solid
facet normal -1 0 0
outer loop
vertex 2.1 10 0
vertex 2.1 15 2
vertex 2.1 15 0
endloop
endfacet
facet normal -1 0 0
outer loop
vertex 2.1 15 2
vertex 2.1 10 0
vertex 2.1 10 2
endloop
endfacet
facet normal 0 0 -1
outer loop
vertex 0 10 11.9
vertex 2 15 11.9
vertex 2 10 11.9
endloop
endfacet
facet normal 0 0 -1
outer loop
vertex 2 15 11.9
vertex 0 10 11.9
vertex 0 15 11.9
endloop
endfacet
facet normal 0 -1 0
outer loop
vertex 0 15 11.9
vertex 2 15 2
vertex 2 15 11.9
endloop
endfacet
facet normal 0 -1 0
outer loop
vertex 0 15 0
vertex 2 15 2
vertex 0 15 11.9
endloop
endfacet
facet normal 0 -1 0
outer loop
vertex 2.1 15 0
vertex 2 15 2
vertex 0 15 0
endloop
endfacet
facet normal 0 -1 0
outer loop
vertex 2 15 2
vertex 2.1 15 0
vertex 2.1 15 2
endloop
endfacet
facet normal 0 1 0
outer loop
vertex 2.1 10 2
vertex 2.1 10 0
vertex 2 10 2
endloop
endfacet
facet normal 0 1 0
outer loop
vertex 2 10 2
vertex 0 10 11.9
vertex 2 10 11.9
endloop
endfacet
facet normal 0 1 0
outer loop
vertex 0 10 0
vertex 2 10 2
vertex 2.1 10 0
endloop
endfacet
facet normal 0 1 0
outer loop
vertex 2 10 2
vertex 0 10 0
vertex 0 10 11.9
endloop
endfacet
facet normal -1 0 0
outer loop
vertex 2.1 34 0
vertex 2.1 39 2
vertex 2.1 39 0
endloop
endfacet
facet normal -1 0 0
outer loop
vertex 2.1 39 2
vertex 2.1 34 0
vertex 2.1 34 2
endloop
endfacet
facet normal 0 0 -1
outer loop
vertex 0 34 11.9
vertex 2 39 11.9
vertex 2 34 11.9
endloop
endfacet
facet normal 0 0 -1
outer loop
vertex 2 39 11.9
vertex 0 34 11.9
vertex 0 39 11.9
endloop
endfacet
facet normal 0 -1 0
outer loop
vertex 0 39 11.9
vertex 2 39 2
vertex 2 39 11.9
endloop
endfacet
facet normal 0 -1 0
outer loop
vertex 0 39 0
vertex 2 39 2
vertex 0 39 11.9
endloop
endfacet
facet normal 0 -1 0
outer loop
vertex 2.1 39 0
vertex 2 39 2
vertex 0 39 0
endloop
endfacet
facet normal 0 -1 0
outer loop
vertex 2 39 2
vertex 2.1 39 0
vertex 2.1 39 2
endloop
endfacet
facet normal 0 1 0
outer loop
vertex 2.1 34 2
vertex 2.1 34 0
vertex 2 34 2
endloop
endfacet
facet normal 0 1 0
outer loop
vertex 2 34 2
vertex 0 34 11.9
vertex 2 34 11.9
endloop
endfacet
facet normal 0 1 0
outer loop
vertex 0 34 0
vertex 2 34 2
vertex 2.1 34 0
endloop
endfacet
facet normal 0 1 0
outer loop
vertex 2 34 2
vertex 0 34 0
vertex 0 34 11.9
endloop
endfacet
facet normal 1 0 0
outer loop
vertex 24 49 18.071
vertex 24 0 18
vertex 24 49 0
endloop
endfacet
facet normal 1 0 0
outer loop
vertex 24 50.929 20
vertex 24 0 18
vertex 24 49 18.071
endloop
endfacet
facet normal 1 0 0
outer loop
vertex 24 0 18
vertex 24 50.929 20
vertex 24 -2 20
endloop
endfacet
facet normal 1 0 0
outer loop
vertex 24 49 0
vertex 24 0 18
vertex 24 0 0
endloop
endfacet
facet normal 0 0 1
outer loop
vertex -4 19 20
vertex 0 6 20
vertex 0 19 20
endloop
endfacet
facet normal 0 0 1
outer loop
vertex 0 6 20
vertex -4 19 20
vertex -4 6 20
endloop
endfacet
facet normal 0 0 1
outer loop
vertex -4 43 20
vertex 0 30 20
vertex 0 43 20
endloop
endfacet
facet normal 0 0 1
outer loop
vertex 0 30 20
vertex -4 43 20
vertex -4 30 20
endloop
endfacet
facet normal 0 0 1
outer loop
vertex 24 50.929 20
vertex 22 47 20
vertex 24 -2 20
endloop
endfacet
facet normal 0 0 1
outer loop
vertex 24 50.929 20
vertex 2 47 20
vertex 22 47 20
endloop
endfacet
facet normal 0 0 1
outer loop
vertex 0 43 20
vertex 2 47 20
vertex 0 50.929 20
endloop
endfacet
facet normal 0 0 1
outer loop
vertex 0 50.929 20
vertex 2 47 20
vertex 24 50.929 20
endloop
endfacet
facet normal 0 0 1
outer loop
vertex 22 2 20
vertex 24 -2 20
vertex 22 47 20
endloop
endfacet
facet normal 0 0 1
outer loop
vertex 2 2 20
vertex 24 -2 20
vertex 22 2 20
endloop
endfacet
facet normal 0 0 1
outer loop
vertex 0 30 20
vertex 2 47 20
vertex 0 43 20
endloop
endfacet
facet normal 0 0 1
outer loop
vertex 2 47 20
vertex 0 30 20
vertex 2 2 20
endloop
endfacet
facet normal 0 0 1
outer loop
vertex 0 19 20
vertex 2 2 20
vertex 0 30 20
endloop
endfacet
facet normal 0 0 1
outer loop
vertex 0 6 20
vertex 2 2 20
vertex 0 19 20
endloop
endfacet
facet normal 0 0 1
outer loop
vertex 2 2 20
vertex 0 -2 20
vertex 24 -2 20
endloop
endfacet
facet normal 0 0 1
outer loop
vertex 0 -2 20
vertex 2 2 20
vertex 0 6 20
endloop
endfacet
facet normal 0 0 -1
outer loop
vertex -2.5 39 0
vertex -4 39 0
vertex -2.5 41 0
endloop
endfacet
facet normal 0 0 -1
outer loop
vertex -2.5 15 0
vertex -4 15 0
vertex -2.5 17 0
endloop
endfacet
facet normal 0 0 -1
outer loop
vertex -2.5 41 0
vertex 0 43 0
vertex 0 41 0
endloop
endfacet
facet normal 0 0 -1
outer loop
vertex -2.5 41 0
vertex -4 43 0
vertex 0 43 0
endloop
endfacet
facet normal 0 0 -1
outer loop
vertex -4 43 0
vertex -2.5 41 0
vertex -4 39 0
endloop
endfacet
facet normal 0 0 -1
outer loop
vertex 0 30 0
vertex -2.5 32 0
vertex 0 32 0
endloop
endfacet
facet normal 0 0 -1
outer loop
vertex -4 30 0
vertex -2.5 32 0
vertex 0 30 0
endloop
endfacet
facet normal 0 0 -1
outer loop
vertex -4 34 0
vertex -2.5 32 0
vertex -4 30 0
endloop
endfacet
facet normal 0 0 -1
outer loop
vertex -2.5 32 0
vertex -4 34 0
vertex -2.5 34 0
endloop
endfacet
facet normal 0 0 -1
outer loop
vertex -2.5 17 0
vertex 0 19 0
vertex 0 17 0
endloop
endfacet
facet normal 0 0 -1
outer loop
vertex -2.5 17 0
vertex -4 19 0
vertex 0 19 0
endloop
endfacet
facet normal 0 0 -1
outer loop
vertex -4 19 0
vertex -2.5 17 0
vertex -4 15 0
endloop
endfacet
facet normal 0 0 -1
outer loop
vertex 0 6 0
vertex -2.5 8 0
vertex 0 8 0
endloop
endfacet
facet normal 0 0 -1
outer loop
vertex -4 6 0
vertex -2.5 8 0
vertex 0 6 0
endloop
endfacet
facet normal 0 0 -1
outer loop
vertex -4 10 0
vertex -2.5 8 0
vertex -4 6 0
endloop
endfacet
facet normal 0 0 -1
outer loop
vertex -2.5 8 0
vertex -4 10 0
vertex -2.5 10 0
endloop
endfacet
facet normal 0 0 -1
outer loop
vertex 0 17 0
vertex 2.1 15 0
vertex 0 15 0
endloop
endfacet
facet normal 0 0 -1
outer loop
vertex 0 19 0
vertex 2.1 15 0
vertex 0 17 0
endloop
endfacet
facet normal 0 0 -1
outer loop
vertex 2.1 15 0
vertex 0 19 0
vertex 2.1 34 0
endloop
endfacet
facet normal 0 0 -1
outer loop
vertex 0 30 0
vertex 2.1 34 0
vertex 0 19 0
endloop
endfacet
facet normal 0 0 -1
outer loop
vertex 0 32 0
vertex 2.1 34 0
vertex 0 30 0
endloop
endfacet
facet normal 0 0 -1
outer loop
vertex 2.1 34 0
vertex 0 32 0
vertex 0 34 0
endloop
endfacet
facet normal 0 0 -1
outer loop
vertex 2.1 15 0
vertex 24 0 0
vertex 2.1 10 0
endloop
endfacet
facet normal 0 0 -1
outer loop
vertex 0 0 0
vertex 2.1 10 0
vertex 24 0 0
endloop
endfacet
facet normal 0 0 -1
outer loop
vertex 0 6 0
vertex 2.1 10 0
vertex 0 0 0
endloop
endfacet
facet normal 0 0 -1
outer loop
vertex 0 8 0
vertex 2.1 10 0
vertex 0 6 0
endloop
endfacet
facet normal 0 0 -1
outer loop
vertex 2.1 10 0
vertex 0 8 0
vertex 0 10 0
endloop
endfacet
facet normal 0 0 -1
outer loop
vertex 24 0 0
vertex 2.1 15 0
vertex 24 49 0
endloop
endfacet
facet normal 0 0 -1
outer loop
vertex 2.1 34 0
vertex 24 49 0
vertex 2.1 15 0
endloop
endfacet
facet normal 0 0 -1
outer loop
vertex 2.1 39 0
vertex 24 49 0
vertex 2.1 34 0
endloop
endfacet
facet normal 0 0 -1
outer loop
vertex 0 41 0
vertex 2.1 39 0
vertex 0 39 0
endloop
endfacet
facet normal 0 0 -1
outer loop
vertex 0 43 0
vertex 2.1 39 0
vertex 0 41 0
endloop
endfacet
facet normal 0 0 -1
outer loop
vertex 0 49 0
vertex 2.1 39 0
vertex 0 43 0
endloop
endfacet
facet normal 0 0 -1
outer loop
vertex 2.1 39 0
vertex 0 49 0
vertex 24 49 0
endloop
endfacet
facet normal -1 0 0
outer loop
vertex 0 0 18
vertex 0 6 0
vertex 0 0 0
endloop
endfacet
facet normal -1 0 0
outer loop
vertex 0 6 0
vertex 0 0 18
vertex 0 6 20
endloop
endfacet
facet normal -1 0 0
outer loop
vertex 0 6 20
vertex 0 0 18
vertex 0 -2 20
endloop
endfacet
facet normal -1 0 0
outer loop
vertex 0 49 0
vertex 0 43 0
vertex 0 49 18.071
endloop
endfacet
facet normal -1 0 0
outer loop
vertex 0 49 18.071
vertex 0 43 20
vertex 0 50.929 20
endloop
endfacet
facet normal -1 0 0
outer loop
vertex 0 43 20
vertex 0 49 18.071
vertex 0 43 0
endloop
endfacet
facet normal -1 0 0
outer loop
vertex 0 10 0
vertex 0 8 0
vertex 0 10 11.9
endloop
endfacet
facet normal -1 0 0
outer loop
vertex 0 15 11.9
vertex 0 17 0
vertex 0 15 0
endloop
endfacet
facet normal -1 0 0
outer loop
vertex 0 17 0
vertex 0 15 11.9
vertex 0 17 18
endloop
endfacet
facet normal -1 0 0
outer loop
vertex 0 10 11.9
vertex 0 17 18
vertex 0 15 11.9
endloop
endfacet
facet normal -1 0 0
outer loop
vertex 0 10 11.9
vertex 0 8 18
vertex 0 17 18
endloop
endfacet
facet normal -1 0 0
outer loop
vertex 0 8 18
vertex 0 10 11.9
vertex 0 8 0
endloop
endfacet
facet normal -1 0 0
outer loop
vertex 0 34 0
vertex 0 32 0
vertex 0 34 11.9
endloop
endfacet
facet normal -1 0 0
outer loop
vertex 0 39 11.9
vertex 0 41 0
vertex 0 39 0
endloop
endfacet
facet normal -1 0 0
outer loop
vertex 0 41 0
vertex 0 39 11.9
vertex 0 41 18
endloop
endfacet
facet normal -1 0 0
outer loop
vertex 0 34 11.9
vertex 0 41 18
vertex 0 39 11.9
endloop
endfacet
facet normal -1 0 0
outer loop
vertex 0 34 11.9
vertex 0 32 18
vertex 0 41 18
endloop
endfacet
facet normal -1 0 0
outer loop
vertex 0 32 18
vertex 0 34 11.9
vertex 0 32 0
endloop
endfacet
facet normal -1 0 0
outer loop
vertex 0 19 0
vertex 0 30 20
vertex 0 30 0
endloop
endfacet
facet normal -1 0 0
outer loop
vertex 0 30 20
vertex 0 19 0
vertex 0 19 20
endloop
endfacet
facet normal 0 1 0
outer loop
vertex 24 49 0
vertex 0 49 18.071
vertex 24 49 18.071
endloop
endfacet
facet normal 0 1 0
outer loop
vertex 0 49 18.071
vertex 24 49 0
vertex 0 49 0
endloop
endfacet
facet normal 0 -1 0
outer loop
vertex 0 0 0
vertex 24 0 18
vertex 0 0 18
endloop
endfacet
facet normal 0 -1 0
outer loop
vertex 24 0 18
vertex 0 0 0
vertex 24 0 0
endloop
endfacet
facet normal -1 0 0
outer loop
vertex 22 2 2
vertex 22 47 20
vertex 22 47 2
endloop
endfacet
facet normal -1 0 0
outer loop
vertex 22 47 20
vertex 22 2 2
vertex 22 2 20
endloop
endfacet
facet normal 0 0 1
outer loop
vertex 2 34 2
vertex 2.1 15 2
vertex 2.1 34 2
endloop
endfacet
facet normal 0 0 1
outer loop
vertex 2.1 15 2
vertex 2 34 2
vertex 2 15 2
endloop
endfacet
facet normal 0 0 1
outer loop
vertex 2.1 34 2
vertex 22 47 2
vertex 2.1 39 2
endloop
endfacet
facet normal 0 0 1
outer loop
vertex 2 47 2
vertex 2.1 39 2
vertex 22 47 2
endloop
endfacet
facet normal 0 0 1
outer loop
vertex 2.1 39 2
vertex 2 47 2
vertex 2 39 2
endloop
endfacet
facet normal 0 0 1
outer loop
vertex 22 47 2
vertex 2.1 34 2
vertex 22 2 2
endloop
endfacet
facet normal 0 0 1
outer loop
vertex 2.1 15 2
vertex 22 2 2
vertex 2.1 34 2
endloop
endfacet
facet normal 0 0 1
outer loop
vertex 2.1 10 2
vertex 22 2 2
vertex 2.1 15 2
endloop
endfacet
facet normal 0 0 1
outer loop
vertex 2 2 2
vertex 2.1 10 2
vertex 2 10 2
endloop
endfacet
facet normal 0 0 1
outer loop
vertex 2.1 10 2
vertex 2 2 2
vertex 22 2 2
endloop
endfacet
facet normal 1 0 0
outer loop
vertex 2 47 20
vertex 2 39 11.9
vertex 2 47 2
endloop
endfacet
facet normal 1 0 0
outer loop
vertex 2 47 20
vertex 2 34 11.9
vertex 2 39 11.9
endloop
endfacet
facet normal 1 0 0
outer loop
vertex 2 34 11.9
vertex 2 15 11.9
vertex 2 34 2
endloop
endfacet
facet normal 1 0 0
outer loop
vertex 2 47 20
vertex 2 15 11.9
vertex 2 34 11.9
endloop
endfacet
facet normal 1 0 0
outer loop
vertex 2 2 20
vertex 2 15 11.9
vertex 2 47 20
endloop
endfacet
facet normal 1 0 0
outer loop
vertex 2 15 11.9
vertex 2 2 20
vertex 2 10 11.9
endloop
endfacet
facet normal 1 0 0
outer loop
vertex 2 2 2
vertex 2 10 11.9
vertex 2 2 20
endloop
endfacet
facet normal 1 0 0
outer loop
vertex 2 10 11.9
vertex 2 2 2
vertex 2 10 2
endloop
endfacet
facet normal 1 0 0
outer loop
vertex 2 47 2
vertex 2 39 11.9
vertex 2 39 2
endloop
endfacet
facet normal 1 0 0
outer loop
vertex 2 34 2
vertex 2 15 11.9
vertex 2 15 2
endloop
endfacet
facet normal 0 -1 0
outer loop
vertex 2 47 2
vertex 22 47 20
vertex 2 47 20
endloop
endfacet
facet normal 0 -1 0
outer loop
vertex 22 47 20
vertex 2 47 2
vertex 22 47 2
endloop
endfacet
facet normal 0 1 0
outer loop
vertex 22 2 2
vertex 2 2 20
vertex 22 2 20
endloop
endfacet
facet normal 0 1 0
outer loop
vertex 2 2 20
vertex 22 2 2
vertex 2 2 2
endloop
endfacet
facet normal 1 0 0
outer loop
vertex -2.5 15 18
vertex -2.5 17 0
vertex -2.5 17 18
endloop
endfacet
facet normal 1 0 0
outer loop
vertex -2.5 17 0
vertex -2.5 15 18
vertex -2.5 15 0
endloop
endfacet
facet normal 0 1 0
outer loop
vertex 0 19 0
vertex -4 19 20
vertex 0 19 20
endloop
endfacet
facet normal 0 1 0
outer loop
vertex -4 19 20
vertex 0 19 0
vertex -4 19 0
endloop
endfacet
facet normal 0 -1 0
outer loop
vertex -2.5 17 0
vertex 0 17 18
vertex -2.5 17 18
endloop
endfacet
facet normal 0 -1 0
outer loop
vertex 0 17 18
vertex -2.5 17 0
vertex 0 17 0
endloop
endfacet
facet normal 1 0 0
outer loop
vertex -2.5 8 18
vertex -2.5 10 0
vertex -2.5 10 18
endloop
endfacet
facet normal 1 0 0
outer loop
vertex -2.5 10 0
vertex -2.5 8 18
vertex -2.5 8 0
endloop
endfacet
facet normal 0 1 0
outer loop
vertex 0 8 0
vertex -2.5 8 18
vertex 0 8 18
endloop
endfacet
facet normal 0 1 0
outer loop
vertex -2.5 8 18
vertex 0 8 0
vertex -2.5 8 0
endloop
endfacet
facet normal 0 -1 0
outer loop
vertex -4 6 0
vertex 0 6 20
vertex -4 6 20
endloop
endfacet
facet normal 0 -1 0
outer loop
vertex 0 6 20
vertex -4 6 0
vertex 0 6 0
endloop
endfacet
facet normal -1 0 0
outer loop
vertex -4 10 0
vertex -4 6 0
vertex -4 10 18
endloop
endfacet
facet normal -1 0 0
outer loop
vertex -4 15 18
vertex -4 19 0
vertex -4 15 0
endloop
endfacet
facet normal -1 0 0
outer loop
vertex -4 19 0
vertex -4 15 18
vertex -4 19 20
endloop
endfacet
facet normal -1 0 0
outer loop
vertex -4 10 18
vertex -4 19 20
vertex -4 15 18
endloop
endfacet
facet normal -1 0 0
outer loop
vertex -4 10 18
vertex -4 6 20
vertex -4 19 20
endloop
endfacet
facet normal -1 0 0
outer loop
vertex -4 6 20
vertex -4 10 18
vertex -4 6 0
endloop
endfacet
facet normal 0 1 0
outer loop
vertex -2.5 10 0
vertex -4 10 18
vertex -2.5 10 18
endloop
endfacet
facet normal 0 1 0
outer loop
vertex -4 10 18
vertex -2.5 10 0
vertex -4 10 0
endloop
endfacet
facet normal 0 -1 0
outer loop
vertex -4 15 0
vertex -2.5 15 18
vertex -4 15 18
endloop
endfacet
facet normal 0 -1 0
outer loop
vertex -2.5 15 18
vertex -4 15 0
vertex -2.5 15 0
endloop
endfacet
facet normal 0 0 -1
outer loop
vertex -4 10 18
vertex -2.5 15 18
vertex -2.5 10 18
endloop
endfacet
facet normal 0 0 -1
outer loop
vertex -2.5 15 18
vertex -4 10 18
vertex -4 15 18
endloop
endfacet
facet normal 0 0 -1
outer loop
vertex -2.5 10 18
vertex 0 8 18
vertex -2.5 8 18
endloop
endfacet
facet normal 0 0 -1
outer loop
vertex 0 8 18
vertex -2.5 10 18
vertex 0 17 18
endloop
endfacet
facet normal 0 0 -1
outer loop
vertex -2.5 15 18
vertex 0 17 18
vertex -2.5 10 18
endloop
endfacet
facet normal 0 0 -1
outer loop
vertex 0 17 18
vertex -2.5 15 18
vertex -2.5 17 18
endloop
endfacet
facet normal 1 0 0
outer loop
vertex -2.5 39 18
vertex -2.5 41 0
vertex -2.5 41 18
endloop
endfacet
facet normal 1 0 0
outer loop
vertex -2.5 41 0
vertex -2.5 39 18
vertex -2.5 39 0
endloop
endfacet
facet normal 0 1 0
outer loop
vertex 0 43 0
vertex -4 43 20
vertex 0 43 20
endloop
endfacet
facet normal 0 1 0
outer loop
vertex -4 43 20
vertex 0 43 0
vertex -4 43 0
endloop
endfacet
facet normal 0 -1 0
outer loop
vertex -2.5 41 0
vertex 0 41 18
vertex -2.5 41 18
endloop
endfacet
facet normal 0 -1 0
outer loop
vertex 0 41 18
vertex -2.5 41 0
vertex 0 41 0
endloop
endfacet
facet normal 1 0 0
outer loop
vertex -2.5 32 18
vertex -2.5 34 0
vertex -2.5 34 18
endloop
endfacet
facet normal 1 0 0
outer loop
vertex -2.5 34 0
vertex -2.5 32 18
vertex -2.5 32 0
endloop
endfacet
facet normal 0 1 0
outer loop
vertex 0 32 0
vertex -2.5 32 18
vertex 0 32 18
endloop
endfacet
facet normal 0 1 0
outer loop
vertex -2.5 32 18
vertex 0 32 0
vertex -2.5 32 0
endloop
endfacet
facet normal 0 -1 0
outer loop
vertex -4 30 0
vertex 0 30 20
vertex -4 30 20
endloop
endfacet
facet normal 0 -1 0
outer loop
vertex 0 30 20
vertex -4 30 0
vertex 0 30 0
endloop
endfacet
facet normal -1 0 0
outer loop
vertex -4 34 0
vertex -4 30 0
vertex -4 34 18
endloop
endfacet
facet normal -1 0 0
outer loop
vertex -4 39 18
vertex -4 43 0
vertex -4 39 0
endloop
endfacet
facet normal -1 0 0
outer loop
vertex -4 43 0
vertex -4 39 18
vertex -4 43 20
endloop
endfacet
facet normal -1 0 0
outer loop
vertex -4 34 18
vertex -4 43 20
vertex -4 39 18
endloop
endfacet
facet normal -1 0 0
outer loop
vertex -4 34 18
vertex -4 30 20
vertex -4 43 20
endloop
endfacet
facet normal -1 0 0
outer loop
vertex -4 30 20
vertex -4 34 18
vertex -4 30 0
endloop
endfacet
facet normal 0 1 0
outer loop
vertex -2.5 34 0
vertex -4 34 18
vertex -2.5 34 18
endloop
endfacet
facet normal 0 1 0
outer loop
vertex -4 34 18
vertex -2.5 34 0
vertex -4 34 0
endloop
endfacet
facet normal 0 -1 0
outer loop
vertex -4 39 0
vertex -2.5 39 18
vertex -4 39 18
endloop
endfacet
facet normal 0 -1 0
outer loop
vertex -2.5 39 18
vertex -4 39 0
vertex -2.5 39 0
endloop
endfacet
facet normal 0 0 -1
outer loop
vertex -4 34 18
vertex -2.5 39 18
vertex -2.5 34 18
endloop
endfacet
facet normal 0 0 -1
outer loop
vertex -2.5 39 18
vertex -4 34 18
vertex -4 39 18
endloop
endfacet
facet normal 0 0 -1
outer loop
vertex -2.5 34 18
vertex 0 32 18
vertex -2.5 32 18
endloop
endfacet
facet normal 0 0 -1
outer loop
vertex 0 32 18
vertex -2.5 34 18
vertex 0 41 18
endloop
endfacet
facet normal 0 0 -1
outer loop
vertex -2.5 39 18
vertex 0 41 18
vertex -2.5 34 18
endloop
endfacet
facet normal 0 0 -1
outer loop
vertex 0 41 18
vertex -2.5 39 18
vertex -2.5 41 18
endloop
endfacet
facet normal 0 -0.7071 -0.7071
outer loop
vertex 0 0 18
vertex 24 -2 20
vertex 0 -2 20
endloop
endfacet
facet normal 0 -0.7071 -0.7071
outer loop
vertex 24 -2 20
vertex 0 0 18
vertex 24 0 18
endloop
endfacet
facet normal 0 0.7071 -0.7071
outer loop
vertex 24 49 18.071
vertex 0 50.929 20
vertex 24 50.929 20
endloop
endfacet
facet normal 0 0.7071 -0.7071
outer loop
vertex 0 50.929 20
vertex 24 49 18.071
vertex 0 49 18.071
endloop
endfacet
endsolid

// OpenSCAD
// (C) 2016 B. Visee, info@lichtsignaal.nl
// This is for making lightboxes in, mostly, h0-scale, houses
// No guarentees, but I like it!

// You can make it all sorts of sizes with an adjustable
// number of holes for your LED's (also adjustable!)
// Printed at 0.25mm or 0.3mm height. 0.4 is too big
// The parameters are INSIDE sizes!

// ===================================
// ** CHANGELOG
// ===================================

// v1 Added better spacing for holes
//    Added holestart parameter so you can align hole(s) from the sides
// v2 Started working on inner walls for bigger boxes, easier to glue
// v3 Add one print mount, have to do the multiple ones yet ;)

// ===================================
// ** ToDo
// ===================================

// Add inner-wall options, with auto?

// ===================================
// ** START USER PARAMETERS
// ===================================

// Basic sizes (inner sizes)
depth = 20;
width = 45;
height = 20;
thick = 2;          // Thickness of box walls, varies for printers
                    // Does not affect bottom btw! That is steady 2mm.
thicklimit = 6;     // Limit for adding 45 degree supports                    

// Holes with automatic spacing
enableholes = 0;    // Simple holes in the back
diameter = 3.5;     // On my da Vinci this is the size for 3mm LED
numholes = 3;       // Number of holes you want, if set auto = 0
holestart = 5;      // Start/end position of hole

// Mount for print, no automatic spacing for maximum flexibility
enableprint = 1;    // Adds a slide-in mount for a print
printwidth = 6;
numprints = 2;
printspacing = 24;  // Space between print mounts
printstart = 6;     // Y-start position

// ===================================
// ** END USER PARAMETERS
// ===================================

// For good measure
outerdepth = depth + (thick*2);     // X
outerwidth = width + (thick*2);     // Y
outerheight = height;               // Z

// TESTING

// END TESTING

// Space between inner holes
holespacing = ( width - ( ( holestart * 2 ) + diameter ) ) / (numholes - 1);

union()
{
    difference()
    {
        // Base cube
        cube([outerdepth,outerwidth,outerheight]);

        translate([thick, thick, 2])
        {
            cube([depth,width,height]);
        }
        
        // Slider opening
        if(enableprint)
        {
            // Add center one for one print, ToDo
            for (n = [ 0 : (numprints-1) ])
            {
                translate([0,printstart+(n*printspacing),0])
                {
                    difference()
                    {
                        translate([-0.5,4,-0.1])
                        {
                            cube([0.6+thick,printwidth-1,height-8]);
                        }
                    }
                }
            }
        }
        
        // Holes in the back
        if(enableholes)
        {
            if(numholes == 1)
            {
                translate([(depth/2)+(thick),(outerwidth/2),-3])
                {
                    cylinder(10,d=diameter,diameter/2,$fn=64);
                }
            }
            else
            {
                for (n = [ 1 : numholes ] )
                {
                    
                    if( n == 1 )
                    {
                        translate([(depth/2)+(thick),holestart+thick+(diameter/2),-3])
                        {
                            cylinder(10,d=diameter,diameter/2,$fn=64);
                        }
                    }
                   
                    if ( (n == numholes) && ( n != 1) )
                    {
                        translate([(depth/2)+(thick),width - ( (holestart-thick) +(diameter/2) ),-3])
                        {
                            cylinder(10,d=diameter,diameter/2,$fn=64);
                        }
                    }
                    
                    if( ( n != 1) && ( n != numholes) )
                     {
                        translate([(depth/2)+(thick),( (holespacing* (n-1) )+thick+holestart+(diameter/2)),-3])
                        {
                            //echo( ( (holespacing* (n-1) )+thick+holestart+diameter));
                            cylinder(10,d=diameter,diameter/2,$fn=64);
                        }
                    }   
                }
            }
        }
    }
    
    // Print slider stuff
    if(enableprint)
    {
        for (n = [ 0 : (numprints-1) ])
            {
                translate([0,printstart+(n*printspacing),0])
                {
                    union()
                    {
                        // Sliding part
                        translate([-2.5,printwidth+5,0])
                        {
                            cube([2.5,2,height]);
                        }

                        translate([-2.5,0,0])
                        {
                            cube([2.5,2,height]);
                        }

                        translate([-4,0,0])
                        {
                            cube([1.5,4,height]);
                        }

                        translate([-4,printwidth+3,0])
                        {
                            cube([1.5,4,height]);
                        }
                        
                        translate([-4,1.5,height-2])
                        {
                            cube([4,printwidth+3.5,2]);
                        }
                    }
                }
            }
    }
    
    // Glue edges for smaller sizes
    if(thick<thicklimit)
    {
        translate([0,0,-2])
        {
            difference()
            {
                translate([0,-2,height])
                {    
                    cube([outerdepth,2,2]);
                }

                translate([-1,1,height-1])
                {
                    rotate([135,0,0])
                    {
                        cube([outerdepth+2,5,5]);
                    }
                }
            }
        }
        
        translate([0,outerwidth+2,-2])
        {
            difference()
            {
                translate([0,-2,height])
                {    
                    cube([outerdepth,2,2]);
                }

                translate([-1,4,height-1])
                {
                    rotate([135,0,0])
                    {
                        cube([outerdepth+2,5,5]);
                    }
                }
            }
        }
    }
}
